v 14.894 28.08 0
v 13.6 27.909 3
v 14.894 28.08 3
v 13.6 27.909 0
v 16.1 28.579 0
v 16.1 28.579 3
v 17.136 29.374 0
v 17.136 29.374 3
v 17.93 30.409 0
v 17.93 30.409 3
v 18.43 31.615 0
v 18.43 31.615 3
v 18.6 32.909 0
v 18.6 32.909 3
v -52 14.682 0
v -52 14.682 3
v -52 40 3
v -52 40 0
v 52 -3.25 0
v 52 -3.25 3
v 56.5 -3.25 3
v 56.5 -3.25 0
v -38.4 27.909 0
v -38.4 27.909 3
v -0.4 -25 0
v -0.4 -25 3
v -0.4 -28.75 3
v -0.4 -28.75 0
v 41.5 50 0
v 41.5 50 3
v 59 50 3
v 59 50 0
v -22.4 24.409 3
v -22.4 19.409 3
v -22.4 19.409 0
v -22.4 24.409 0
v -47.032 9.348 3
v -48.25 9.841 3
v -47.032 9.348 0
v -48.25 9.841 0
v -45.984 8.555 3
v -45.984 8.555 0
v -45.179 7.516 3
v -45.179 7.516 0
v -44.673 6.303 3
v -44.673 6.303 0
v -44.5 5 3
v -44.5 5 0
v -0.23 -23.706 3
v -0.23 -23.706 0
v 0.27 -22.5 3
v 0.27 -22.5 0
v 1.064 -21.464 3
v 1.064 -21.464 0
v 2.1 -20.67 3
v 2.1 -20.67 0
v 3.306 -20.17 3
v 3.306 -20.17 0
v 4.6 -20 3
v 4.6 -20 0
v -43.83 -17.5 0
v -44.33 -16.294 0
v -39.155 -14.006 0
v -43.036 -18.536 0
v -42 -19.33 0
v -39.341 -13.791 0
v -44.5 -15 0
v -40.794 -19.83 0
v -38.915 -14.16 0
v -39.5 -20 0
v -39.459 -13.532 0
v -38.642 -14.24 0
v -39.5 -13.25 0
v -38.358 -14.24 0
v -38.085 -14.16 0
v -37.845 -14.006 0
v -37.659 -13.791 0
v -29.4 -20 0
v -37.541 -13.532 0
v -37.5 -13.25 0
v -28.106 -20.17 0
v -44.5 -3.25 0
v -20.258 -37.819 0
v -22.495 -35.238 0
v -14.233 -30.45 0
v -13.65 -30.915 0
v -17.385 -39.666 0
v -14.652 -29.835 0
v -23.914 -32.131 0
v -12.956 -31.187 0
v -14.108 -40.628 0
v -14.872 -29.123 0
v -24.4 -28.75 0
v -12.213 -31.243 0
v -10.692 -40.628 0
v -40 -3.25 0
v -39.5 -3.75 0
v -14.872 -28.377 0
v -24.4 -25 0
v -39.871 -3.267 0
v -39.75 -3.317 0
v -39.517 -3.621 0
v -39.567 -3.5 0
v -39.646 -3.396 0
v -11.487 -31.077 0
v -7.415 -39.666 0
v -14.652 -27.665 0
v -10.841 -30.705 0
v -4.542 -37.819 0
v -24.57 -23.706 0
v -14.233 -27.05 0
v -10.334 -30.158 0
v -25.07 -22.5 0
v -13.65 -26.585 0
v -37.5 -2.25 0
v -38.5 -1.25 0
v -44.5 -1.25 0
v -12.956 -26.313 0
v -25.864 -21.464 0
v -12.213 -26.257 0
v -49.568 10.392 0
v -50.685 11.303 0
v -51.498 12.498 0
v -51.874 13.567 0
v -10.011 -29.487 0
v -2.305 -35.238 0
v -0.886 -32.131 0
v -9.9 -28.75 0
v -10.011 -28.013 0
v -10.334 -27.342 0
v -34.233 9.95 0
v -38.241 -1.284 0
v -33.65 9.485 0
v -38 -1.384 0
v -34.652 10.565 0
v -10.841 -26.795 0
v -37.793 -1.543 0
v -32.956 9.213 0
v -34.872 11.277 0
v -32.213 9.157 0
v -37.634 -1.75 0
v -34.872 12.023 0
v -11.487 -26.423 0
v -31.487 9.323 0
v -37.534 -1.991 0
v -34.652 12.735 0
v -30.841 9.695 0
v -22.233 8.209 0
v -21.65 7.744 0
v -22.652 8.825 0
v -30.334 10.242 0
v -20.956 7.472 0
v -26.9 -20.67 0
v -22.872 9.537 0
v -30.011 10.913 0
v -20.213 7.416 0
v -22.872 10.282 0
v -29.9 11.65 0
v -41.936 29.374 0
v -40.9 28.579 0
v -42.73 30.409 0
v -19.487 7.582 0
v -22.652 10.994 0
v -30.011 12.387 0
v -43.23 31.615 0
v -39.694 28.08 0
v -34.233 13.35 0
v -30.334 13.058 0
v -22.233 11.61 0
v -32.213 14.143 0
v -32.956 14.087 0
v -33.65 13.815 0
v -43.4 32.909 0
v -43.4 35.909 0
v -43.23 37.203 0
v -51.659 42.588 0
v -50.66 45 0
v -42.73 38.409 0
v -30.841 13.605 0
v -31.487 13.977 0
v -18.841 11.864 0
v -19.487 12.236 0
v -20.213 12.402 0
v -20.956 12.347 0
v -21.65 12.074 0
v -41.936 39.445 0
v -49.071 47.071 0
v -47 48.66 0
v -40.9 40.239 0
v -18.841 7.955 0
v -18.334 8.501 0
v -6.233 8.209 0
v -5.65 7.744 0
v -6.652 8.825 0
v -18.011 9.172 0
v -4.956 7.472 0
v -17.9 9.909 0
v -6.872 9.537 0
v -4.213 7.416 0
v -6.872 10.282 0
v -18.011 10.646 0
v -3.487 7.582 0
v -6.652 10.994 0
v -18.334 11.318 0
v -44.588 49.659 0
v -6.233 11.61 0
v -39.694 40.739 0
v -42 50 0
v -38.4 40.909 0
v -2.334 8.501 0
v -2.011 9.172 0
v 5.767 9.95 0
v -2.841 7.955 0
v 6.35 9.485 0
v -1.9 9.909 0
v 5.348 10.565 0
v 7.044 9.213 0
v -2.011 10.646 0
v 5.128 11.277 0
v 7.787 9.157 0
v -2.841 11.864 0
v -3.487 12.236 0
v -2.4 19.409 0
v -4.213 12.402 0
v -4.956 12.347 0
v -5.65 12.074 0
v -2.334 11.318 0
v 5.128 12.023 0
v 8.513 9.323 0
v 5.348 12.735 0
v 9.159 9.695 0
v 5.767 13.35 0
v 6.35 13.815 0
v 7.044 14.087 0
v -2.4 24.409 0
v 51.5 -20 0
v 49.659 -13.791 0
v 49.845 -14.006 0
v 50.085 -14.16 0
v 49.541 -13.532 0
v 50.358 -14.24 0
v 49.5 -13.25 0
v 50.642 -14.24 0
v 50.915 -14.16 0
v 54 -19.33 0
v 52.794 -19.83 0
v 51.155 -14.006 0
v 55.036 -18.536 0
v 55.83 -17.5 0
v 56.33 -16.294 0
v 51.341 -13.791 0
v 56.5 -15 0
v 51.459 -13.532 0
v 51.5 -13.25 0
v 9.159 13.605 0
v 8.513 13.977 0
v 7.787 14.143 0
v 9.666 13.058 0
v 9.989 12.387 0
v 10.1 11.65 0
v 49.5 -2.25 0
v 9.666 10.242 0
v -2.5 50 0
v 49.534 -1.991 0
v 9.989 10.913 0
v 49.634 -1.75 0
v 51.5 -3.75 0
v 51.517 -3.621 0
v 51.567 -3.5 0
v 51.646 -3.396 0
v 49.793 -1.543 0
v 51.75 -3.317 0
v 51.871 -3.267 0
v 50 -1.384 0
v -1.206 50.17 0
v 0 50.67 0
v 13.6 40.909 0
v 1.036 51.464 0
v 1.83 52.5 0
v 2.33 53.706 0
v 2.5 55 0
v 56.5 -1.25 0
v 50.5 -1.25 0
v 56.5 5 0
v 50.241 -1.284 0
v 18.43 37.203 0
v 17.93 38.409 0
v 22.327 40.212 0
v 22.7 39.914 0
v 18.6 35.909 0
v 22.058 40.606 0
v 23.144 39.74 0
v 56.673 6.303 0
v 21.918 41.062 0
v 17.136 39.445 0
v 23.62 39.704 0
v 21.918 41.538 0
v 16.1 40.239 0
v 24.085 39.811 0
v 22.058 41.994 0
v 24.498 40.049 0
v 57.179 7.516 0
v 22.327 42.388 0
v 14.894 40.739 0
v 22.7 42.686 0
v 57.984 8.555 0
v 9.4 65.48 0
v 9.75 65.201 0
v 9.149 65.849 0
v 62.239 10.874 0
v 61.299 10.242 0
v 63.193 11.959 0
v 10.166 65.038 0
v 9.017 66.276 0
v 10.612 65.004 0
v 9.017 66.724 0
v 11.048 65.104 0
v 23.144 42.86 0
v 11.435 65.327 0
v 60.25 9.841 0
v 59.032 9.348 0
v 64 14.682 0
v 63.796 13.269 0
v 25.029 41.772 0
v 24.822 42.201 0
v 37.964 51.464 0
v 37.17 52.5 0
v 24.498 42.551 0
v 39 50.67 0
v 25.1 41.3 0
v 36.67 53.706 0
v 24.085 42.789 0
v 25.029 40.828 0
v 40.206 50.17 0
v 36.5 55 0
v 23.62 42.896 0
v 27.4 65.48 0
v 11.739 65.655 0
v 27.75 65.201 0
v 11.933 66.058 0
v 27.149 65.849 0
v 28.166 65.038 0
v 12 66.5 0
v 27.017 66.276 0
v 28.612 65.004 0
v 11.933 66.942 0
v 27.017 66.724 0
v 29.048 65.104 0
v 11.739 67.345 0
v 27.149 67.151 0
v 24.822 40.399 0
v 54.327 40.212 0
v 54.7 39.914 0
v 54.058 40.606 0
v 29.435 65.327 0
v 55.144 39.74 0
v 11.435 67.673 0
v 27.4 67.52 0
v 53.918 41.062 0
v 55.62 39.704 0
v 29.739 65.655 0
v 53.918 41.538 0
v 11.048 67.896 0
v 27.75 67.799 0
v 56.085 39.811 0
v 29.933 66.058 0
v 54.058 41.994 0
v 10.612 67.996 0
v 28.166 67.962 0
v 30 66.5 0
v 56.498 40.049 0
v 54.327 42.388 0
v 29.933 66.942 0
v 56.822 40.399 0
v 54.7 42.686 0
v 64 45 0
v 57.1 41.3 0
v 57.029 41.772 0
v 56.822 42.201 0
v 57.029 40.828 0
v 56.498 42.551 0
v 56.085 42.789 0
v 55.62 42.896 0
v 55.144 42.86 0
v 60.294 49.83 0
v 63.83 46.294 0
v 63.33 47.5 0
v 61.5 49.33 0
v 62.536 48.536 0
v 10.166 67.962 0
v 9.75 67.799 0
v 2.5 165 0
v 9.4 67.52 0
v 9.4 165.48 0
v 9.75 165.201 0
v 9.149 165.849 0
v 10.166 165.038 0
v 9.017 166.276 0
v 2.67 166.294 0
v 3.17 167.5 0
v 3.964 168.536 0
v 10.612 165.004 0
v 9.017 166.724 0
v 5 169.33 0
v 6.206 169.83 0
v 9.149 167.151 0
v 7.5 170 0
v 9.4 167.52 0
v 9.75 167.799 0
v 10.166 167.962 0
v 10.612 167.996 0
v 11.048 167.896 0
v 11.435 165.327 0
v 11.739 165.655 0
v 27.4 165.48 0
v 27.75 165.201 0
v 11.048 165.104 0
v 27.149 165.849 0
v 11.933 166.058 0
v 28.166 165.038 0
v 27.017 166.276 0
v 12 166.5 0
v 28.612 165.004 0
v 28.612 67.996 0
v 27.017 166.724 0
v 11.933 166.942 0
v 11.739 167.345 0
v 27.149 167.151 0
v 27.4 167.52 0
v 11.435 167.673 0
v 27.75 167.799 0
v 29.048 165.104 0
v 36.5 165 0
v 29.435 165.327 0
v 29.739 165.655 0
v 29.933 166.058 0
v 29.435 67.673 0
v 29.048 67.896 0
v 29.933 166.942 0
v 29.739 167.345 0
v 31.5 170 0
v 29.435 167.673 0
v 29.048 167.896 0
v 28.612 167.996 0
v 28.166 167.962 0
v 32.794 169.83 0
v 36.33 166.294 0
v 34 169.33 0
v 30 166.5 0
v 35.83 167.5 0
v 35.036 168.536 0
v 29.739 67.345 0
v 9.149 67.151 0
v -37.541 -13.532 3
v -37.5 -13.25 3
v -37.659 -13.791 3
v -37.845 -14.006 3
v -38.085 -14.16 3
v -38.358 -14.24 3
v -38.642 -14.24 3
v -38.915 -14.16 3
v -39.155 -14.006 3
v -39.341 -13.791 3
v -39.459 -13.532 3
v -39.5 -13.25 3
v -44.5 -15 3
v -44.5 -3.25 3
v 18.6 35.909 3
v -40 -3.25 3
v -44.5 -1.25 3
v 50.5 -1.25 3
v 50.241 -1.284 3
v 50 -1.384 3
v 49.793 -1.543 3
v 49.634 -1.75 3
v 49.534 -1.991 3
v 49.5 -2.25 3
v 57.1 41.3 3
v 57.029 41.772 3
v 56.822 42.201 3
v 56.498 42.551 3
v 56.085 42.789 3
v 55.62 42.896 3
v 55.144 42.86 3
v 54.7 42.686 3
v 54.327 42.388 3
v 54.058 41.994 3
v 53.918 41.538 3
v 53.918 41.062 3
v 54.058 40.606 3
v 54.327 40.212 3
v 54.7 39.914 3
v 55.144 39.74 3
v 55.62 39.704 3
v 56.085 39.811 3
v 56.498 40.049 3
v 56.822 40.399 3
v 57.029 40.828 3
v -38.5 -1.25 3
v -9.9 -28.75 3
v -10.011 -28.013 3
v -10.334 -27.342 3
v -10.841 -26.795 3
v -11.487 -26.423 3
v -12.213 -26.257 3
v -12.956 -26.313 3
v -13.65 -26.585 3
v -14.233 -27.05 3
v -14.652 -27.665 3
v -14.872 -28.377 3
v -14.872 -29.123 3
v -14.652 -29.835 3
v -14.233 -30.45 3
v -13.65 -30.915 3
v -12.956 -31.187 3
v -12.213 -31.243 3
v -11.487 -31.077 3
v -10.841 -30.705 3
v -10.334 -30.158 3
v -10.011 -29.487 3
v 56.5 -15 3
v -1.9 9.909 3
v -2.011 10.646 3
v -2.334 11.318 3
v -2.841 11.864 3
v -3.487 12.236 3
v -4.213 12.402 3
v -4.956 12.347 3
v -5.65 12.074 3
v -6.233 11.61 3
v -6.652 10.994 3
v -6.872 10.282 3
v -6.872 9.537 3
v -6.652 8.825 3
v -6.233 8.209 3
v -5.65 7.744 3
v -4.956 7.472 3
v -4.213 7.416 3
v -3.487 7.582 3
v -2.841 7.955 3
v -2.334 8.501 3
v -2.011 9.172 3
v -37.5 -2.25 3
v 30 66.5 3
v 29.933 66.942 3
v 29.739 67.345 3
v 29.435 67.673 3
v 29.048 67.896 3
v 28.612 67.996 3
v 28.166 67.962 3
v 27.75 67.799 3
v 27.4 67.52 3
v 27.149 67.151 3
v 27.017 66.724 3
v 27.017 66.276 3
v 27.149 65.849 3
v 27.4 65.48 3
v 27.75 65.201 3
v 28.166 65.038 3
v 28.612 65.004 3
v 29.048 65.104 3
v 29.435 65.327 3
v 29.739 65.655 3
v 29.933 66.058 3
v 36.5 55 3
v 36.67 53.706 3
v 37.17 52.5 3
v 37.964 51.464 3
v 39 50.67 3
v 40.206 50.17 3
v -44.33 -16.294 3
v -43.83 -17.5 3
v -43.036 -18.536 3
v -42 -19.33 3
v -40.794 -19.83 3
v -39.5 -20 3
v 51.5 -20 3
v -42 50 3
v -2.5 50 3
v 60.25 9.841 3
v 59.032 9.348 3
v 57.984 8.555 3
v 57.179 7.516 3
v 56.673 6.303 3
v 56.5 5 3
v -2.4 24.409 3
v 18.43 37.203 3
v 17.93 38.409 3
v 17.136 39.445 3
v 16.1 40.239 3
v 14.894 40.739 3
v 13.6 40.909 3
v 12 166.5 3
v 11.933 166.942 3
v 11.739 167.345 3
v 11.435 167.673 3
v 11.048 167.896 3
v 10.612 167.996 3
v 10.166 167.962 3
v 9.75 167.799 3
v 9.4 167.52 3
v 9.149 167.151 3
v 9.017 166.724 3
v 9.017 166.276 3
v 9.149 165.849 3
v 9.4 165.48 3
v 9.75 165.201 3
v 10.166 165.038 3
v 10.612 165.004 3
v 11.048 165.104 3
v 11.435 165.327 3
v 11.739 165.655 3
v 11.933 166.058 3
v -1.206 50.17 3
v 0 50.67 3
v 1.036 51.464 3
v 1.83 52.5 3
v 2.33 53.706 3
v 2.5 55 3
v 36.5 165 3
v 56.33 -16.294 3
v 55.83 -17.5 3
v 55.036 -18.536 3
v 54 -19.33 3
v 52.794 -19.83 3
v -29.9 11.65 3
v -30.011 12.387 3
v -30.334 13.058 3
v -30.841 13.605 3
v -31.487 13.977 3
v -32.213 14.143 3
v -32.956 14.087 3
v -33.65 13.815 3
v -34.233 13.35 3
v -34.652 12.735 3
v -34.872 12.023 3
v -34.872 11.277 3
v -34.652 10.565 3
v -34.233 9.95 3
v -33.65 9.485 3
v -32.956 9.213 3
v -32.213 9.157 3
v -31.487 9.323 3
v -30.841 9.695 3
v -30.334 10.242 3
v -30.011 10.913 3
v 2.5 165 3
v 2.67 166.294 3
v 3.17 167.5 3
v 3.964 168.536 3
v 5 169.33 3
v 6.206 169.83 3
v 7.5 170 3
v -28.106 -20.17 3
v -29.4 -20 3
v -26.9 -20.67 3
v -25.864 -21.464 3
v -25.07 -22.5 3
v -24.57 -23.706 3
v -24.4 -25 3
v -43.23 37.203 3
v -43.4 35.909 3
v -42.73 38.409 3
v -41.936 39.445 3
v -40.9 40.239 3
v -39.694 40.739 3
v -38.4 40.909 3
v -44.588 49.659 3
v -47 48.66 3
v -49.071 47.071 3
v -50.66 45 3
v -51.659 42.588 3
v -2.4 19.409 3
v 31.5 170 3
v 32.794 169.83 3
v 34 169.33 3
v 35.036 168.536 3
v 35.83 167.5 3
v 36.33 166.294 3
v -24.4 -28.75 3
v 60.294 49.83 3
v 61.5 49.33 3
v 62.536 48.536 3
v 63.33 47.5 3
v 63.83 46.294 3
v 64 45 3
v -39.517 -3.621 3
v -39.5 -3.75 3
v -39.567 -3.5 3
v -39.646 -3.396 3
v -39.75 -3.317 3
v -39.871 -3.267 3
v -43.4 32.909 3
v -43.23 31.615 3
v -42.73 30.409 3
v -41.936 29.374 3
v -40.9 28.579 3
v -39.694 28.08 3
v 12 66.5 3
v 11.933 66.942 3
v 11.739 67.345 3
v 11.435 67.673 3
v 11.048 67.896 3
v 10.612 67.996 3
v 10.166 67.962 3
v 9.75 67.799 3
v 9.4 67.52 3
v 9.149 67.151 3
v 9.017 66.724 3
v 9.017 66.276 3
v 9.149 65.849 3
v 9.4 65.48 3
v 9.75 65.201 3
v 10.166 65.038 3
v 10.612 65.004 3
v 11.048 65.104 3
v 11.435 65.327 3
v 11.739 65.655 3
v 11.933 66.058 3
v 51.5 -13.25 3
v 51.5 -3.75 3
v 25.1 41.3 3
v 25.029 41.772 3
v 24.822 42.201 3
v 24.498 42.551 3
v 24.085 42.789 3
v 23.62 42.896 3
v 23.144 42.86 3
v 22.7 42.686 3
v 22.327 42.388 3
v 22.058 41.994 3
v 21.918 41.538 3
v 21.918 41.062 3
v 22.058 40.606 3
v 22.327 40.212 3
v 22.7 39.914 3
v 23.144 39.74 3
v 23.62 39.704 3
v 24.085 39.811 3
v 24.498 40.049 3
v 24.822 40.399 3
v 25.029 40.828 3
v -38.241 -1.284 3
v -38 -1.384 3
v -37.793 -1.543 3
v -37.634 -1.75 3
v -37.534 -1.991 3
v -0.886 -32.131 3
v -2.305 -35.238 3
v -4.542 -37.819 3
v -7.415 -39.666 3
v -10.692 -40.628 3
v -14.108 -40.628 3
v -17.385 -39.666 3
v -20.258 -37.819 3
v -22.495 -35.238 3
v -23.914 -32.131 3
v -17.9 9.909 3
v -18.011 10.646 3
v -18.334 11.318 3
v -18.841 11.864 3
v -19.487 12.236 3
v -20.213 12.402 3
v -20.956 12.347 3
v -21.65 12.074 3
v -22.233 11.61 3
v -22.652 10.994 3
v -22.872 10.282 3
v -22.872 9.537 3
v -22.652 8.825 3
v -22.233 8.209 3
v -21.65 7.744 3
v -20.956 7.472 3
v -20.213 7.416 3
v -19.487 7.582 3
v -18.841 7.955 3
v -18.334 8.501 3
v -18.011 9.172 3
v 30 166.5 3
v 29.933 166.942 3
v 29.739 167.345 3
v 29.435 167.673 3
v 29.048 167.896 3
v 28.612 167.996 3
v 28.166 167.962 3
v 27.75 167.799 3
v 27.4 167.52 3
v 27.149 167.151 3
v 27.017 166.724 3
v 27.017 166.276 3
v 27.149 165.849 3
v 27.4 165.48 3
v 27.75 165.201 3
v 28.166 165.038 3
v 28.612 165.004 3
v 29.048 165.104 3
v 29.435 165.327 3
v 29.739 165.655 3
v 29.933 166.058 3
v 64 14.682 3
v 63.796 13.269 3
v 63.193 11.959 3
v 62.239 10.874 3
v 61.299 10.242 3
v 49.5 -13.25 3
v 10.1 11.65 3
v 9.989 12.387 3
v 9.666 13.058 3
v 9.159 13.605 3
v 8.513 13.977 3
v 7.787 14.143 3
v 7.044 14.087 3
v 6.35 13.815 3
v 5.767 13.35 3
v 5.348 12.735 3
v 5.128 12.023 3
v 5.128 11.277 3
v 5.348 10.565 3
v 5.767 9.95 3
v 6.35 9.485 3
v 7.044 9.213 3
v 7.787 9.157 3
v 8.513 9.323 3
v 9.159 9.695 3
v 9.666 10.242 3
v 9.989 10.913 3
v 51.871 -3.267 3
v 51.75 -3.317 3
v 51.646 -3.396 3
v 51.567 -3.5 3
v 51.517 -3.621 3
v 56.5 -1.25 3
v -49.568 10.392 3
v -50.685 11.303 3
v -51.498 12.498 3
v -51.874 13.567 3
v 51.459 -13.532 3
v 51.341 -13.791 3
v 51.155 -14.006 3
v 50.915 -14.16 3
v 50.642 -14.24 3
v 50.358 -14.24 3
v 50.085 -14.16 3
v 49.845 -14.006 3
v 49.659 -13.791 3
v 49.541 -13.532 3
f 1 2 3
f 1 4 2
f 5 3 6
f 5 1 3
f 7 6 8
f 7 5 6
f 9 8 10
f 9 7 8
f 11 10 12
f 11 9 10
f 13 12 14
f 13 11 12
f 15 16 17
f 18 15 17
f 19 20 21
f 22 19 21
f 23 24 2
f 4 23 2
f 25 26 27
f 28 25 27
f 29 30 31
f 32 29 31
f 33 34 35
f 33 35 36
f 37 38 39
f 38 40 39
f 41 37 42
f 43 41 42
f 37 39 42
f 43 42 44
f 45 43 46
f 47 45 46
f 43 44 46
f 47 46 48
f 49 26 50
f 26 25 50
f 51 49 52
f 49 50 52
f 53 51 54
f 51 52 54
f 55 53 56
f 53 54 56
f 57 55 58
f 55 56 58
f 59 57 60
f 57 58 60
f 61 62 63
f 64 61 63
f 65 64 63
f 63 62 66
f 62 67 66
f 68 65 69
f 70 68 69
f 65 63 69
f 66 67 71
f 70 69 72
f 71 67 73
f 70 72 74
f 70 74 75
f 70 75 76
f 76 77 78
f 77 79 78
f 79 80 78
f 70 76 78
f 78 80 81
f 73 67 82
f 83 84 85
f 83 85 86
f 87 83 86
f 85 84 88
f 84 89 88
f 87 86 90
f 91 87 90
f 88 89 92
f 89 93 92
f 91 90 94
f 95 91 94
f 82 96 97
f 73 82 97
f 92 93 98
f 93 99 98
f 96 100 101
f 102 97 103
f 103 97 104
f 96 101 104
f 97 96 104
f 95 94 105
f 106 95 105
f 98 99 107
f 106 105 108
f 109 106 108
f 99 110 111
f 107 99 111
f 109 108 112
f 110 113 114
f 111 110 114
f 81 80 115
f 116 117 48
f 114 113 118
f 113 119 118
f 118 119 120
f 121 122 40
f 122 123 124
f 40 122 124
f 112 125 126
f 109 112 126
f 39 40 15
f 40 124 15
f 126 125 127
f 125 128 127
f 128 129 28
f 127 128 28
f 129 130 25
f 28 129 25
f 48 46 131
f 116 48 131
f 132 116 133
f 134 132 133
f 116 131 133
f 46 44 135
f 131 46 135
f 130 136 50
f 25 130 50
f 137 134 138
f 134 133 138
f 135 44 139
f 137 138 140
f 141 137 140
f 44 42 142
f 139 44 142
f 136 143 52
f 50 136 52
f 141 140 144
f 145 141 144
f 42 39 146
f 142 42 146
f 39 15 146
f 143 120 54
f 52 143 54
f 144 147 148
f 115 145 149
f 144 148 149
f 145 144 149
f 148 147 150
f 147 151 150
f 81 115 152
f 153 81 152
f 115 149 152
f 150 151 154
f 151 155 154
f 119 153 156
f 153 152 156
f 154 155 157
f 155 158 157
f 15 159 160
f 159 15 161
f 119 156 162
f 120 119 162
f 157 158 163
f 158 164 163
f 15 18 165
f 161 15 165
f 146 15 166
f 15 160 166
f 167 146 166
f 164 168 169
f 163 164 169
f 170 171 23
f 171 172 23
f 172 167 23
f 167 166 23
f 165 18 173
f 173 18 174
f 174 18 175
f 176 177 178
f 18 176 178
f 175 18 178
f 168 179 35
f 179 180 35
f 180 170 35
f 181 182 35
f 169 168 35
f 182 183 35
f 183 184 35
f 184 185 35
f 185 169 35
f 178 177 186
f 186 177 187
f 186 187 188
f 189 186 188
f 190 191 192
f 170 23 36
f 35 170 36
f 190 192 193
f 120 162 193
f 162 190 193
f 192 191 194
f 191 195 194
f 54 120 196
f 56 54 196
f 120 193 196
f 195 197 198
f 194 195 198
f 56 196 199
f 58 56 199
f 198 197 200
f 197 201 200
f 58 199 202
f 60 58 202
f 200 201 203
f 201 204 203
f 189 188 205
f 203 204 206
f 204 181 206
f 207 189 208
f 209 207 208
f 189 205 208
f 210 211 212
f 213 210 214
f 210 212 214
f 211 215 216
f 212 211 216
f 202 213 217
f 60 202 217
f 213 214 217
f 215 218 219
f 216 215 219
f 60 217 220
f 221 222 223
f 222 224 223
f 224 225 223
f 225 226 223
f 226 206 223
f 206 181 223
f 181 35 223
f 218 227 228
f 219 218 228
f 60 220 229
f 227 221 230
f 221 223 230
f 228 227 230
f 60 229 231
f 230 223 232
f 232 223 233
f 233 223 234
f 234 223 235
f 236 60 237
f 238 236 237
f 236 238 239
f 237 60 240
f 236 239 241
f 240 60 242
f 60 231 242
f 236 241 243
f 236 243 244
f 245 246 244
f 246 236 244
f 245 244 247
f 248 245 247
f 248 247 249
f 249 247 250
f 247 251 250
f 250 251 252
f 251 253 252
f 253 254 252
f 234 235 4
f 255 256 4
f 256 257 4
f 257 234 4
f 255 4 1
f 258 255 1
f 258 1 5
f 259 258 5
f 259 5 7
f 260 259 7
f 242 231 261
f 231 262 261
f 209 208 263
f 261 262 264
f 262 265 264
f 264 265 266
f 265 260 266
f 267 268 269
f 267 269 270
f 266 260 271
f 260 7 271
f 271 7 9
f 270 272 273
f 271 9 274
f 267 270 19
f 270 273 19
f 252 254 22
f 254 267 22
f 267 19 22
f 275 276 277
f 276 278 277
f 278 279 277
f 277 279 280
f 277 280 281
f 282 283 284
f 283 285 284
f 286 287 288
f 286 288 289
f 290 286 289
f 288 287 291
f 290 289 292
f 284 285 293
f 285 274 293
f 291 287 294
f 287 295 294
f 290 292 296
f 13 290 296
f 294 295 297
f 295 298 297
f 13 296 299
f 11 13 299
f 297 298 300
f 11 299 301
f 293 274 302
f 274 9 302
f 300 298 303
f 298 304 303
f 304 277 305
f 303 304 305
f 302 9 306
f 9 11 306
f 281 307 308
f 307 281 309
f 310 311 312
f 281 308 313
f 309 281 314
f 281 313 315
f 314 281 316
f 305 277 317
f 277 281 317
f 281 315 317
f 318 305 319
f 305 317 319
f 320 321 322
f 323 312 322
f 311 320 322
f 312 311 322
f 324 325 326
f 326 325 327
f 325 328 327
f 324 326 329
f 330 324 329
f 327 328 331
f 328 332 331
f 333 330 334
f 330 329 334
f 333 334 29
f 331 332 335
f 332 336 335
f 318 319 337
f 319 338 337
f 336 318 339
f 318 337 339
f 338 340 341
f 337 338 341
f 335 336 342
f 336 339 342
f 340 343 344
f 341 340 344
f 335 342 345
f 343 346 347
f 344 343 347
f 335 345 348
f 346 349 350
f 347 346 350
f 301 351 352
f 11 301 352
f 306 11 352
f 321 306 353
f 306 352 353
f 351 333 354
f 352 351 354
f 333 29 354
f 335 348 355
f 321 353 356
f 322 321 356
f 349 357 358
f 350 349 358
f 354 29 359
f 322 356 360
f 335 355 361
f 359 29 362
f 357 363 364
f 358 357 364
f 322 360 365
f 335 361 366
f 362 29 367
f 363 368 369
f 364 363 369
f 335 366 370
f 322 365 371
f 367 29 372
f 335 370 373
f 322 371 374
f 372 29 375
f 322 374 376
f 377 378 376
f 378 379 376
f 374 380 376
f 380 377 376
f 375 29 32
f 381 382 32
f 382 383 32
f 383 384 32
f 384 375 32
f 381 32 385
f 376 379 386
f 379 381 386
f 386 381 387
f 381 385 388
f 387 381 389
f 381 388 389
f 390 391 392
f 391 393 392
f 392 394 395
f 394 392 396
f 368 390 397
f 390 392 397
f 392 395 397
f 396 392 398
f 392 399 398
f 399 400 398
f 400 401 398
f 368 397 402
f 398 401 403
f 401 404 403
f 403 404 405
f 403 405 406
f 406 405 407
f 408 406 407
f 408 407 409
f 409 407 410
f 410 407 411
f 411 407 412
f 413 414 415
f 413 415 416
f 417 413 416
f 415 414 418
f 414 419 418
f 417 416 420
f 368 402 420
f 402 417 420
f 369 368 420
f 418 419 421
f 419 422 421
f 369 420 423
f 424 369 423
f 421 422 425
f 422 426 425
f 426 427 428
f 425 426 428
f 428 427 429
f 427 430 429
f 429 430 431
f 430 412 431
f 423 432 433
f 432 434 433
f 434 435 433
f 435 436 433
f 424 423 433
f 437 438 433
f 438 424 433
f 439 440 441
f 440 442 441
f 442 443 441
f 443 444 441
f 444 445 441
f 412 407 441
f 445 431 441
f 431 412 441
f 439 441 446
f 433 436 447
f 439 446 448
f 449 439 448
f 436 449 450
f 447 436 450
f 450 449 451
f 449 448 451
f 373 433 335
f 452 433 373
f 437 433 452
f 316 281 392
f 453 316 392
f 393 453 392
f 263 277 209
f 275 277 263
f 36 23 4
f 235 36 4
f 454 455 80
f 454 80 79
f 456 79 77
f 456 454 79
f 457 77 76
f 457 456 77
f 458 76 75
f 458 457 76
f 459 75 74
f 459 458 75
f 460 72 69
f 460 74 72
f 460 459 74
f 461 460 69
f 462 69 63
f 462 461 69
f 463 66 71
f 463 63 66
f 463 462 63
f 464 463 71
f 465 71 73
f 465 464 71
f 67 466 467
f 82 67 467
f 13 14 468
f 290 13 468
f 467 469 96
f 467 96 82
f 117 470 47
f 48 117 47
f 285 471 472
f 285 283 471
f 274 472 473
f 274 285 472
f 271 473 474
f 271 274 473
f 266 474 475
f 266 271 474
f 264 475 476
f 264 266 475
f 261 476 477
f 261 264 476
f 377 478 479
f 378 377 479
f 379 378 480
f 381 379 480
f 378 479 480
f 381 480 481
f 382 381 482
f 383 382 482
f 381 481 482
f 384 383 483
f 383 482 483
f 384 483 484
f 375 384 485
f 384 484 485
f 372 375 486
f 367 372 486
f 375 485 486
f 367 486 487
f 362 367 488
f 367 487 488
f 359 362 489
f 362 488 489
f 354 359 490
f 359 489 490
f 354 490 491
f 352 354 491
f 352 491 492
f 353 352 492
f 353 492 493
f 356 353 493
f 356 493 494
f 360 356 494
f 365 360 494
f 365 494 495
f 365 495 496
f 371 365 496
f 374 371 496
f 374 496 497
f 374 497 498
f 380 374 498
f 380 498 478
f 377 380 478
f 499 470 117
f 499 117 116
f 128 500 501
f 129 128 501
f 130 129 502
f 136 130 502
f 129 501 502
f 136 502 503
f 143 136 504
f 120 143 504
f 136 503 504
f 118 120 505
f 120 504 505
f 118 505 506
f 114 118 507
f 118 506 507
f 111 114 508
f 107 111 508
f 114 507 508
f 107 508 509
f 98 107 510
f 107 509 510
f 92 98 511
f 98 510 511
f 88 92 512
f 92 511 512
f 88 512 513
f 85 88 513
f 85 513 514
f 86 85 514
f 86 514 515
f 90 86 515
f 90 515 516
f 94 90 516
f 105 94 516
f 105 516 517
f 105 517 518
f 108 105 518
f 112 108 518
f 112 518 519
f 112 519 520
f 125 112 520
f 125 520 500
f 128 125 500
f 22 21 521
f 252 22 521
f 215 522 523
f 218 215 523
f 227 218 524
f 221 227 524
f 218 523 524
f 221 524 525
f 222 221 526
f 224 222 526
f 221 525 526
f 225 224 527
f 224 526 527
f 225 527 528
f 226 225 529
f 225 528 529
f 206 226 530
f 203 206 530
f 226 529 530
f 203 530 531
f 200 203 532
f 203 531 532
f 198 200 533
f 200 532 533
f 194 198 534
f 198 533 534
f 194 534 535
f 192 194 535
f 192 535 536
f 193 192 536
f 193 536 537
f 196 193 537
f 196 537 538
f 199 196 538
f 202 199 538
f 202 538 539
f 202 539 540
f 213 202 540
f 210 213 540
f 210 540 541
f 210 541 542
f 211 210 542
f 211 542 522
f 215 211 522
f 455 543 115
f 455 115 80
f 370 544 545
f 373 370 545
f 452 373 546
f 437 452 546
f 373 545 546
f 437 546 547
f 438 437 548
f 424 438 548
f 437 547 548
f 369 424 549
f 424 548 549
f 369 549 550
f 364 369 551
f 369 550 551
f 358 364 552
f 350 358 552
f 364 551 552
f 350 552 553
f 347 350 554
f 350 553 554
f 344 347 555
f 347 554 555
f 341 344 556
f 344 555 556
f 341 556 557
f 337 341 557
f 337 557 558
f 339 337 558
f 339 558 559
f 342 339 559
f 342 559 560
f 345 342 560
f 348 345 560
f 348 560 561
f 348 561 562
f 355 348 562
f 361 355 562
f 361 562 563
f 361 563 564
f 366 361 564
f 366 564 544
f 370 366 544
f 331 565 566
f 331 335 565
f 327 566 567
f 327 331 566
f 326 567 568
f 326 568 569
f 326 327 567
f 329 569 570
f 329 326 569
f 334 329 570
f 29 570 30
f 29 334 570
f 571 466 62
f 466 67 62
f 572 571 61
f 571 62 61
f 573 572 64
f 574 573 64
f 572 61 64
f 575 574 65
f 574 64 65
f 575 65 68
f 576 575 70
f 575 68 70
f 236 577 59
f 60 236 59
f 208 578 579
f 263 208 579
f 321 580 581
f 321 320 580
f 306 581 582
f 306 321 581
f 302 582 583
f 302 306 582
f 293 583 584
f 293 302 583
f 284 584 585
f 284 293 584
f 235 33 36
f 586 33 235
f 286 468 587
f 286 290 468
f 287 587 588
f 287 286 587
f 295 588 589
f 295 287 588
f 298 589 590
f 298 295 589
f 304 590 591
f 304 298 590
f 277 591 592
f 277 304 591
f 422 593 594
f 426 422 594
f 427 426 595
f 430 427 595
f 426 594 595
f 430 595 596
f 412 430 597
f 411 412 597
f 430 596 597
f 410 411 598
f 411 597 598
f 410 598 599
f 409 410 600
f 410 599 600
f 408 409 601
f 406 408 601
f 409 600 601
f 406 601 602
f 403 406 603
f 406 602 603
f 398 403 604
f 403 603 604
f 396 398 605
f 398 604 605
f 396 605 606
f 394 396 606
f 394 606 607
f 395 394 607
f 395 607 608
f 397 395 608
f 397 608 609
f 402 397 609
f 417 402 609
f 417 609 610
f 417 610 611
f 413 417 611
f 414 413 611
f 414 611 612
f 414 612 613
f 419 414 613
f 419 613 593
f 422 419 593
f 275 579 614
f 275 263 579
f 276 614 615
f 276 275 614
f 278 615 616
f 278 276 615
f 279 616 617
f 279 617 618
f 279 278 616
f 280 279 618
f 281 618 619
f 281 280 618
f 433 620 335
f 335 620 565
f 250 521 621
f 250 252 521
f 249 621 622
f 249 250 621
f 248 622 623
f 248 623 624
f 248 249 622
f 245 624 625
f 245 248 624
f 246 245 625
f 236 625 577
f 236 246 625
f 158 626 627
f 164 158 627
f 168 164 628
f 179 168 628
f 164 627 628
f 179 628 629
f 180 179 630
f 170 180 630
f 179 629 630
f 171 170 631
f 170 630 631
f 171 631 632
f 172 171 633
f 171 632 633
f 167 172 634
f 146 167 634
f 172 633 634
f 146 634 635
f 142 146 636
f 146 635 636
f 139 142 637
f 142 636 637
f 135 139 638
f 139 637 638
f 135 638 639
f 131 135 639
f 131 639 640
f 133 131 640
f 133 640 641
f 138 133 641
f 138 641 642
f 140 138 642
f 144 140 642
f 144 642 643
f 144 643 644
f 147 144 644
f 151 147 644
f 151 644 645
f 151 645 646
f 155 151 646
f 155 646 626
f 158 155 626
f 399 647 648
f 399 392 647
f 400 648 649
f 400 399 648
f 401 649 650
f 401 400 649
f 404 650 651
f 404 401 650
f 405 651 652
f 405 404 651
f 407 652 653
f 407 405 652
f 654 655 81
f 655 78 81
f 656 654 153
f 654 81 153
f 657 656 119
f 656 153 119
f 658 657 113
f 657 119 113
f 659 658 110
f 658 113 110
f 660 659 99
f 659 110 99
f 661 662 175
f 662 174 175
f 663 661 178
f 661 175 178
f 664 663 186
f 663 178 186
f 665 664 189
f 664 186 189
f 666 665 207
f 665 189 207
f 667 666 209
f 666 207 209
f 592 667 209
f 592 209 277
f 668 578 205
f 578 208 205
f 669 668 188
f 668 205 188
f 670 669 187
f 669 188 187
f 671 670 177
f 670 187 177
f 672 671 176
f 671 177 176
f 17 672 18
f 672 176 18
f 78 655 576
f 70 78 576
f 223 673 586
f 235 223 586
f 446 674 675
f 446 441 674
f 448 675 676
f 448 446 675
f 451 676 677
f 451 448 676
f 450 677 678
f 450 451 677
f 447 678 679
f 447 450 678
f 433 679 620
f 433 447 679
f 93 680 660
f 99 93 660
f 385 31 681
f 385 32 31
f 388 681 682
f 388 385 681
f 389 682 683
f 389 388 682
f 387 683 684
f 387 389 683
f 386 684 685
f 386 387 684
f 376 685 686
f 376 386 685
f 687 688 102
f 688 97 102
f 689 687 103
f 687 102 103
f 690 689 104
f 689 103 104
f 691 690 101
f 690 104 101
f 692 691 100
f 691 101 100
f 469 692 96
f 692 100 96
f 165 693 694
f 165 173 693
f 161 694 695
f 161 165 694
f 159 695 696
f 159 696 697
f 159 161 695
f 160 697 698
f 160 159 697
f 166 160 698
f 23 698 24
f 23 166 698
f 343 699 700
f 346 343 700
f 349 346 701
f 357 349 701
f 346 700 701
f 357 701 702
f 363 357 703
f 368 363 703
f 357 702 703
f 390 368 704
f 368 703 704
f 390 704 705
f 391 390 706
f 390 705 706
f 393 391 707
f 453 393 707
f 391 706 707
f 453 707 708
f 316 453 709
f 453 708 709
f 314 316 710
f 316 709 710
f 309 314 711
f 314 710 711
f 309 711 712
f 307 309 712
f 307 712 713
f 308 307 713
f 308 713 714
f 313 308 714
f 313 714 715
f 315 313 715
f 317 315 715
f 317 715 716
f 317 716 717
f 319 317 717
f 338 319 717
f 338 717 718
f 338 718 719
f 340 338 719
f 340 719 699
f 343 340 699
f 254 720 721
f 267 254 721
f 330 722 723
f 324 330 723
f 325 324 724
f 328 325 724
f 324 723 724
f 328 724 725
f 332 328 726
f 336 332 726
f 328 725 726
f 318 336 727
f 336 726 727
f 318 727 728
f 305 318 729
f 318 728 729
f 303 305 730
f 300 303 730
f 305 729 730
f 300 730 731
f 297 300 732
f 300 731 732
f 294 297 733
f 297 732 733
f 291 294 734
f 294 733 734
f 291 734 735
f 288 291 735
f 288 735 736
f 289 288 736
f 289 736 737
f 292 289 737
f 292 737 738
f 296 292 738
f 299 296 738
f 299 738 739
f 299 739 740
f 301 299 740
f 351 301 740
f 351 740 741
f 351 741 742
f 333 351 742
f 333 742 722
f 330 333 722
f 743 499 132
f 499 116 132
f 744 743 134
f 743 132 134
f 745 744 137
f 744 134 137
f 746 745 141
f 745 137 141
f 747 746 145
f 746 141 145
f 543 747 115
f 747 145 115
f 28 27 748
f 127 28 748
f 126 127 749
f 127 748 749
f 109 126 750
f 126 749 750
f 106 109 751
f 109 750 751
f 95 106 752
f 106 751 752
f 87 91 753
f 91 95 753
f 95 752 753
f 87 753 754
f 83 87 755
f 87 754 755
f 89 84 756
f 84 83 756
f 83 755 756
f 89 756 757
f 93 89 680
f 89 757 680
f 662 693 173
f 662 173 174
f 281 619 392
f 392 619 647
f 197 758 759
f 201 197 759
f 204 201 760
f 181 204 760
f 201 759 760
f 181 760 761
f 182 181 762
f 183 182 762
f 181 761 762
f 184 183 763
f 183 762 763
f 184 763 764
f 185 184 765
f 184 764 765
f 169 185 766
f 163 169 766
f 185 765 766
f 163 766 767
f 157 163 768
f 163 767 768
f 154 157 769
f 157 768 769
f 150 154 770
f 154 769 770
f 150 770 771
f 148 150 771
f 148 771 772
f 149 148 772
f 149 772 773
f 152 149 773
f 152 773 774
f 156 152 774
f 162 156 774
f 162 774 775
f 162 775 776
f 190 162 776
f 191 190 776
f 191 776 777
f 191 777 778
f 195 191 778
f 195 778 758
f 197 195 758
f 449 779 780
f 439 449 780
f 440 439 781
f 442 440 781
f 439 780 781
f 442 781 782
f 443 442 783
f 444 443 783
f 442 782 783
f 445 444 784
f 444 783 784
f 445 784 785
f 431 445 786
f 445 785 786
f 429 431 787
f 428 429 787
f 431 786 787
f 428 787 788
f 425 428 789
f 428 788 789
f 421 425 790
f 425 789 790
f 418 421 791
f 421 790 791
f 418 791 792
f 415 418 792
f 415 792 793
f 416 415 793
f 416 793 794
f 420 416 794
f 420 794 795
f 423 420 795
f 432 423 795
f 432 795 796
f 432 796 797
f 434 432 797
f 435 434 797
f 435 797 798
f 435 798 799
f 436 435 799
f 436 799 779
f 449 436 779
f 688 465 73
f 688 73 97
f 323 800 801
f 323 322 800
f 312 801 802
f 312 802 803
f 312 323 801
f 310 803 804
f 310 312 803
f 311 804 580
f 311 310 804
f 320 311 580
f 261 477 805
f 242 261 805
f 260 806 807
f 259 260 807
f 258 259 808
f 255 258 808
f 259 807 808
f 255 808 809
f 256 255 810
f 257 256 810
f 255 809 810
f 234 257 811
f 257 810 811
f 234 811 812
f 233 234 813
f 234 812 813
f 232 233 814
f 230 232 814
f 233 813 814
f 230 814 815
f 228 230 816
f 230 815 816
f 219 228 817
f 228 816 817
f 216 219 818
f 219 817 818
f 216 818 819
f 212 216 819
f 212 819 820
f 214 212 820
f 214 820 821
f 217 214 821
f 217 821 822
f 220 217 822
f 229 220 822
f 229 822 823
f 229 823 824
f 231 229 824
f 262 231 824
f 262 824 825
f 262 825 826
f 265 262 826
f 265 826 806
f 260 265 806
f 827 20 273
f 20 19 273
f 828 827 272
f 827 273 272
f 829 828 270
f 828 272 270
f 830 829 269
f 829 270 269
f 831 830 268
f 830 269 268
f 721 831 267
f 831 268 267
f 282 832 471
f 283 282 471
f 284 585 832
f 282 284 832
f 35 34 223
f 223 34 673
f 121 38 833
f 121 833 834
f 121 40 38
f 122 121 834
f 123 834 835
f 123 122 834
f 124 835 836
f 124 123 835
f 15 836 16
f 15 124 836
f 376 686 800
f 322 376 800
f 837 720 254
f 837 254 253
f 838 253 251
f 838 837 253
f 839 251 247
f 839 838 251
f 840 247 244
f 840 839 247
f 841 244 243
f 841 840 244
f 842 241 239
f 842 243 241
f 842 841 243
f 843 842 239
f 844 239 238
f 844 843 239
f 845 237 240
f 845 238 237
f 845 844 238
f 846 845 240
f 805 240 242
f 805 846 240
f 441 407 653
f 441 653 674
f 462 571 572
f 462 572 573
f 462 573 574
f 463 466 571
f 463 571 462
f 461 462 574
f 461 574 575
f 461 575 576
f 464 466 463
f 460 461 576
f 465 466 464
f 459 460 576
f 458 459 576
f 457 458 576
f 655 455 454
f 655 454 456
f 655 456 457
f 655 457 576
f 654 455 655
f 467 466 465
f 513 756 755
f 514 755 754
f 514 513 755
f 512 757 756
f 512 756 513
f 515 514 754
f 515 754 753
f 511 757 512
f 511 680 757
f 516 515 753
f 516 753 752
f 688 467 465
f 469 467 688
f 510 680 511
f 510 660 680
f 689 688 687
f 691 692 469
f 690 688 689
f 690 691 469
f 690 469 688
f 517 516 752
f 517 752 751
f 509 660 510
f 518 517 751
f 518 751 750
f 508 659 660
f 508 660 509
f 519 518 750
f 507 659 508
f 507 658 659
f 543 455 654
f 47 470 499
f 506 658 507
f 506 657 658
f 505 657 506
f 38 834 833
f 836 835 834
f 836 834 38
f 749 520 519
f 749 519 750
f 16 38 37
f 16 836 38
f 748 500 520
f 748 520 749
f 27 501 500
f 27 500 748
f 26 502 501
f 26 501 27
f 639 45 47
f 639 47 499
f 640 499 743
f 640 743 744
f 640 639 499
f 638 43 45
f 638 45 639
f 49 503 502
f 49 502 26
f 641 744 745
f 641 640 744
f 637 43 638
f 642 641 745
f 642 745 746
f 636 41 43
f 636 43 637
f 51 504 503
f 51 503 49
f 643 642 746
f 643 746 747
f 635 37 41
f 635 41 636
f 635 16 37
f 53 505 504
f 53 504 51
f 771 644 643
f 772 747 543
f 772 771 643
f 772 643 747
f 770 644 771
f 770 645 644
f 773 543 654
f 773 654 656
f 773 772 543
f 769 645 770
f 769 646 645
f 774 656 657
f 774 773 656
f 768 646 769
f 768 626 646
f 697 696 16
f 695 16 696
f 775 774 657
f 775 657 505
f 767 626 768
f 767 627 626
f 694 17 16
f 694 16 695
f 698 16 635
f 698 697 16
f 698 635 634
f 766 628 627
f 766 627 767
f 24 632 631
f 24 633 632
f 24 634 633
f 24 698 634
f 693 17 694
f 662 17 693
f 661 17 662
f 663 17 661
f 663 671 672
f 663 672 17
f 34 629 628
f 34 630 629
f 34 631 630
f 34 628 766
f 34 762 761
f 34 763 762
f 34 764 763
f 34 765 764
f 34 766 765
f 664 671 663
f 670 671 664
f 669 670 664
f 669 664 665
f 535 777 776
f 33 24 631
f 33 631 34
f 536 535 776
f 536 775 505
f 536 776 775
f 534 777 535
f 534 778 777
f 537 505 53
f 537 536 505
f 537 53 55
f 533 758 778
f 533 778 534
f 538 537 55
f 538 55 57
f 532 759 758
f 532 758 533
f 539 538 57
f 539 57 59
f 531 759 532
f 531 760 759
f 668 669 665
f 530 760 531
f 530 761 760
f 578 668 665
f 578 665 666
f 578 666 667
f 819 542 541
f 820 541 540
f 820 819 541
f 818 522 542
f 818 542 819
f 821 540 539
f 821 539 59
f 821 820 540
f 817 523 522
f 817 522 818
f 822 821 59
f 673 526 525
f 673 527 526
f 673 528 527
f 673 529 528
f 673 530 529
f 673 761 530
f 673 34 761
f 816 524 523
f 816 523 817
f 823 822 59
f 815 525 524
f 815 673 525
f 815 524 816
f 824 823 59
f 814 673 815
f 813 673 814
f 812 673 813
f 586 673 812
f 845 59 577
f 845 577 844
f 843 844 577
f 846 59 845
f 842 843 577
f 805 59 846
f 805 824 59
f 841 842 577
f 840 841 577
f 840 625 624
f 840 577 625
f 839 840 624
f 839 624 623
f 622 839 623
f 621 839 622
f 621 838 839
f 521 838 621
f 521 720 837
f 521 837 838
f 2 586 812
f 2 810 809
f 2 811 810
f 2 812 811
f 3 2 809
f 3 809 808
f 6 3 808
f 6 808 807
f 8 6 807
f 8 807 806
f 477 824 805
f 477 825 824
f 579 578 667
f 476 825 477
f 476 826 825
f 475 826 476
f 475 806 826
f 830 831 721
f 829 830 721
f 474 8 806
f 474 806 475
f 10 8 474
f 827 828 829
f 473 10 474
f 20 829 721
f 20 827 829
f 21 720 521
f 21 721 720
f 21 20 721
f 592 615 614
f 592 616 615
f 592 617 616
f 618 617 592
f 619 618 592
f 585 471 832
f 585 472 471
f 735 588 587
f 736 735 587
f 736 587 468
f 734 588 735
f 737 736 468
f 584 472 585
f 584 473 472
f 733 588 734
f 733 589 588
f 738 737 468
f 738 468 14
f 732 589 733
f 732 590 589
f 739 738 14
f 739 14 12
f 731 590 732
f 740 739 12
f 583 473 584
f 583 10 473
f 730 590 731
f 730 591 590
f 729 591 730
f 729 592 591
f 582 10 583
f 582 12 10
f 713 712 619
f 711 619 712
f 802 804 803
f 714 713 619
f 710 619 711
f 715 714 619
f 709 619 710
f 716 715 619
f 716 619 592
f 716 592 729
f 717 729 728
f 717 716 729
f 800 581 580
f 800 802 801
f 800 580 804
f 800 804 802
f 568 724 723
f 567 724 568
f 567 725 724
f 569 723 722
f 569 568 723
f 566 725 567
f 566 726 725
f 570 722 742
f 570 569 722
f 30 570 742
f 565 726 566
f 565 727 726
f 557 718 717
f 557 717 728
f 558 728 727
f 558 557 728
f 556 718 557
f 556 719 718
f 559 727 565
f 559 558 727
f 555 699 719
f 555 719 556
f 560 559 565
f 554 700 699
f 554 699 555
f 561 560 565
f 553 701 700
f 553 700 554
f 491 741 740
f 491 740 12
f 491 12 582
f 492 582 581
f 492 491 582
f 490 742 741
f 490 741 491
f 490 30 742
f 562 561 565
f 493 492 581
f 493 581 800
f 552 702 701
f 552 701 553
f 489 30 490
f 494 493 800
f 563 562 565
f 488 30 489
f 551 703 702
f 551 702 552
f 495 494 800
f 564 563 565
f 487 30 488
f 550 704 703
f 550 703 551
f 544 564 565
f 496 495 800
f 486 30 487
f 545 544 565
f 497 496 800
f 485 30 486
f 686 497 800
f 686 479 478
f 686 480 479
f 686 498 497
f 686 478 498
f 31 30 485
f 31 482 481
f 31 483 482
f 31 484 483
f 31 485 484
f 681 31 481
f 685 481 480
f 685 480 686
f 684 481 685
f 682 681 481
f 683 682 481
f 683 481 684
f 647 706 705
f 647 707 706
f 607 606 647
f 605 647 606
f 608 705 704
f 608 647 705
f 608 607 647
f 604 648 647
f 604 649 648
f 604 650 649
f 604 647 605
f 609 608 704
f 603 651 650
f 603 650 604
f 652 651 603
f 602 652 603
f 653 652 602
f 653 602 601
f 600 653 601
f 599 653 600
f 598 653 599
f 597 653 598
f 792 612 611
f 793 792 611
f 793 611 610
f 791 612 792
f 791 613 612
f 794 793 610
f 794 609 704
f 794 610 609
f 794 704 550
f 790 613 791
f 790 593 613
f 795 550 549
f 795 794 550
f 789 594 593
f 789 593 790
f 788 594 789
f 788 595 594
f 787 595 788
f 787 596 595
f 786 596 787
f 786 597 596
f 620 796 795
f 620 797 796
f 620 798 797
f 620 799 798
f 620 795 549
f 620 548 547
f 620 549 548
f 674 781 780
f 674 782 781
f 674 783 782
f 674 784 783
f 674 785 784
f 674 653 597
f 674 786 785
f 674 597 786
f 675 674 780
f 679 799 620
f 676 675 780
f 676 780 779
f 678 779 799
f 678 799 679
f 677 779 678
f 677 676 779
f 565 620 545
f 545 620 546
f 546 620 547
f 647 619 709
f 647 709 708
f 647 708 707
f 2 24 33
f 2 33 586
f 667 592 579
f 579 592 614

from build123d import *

# Parameters (mm, degrees)
SKETCH1_W           = 200
SKETCH1_H           = 300
SKETCH1_W_2         = 158.527362204
SKETCH1_H_2         = 20
BOSS_EXTRUDE1_DEPTH = 3
SKETCH2_R           = 2.5
CUT_EXTRUDE1_DEPTH  = 5
CUT_EXTRUDE3_DEPTH  = 10
CUT_EXTRUDE4_REACH  = 183.673
SKETCH5_W           = 62
SKETCH5_H           = 13
FILLET2_R           = 5
FILLET3_R           = 10
FILLET4_R           = 5
CUT_EXTRUDE6_REACH  = 183.673
SKETCH7_R           = 1.6
CUT_EXTRUDE7_REACH  = 183.673
SKETCH8_R           = 2.5
SKETCH8_W           = 20
SKETCH8_H           = 5
FILLET6_R           = 1
FILLET7_R           = 0.5
SKETCH9_R           = 1.5
CUT_EXTRUDE8_DEPTH  = 10
FILLET8_R           = 5


with BuildPart() as part:
    # Sketch1 → Boss-Extrude1 (new body)
    with BuildSketch(Plane.XY):
        Rectangle(SKETCH1_W, SKETCH1_H)
        with Locations((20.736318898, 160)):
            Rectangle(SKETCH1_W_2, SKETCH1_H_2)
    extrude(amount=BOSS_EXTRUDE1_DEPTH)

    # Sketch2 → Cut-Extrude1 (cut)
    with BuildSketch(Plane.XY.offset(3)):
        with Locations((-12.4, -28.75)):
            Circle(SKETCH2_R)
        with Locations((7.6, 11.65)):
            Circle(SKETCH2_R)
        with Locations((-32.4, 11.65)):
            Circle(SKETCH2_R)
        Polygon((-44.5, -3.25), (-44.5, -1.25), (-37.5, -1.25), (-37.5, -13.25), (-39.5, -13.25), (-39.5, -3.25), align=None)
        Polygon((51.5, -3.25), (56.5, -3.25), (56.5, -1.25), (49.5, -1.25), (49.5, -13.25), (51.5, -13.25), align=None)
        with BuildLine():
            Line((-44.5, -3.25), (-44.5, -1.25))
            ThreePointArc((-44.5, -1.25), (-45.5, -2.25), (-44.5, -3.25))
        make_face()
        with BuildLine():
            ThreePointArc((-37.5, -13.25), (-38.5, -14.25), (-39.5, -13.25))
            Line((-39.5, -13.25), (-37.5, -13.25))
        make_face()
        with BuildLine():
            ThreePointArc((51.5, -13.25), (50.5, -14.25), (49.5, -13.25))
            Line((49.5, -13.25), (51.5, -13.25))
        make_face()
        with BuildLine():
            ThreePointArc((56.5, -1.25), (57.5, -2.25), (56.5, -3.25))
            Line((56.5, -3.25), (56.5, -1.25))
        make_face()
    extrude(amount=-CUT_EXTRUDE1_DEPTH, mode=Mode.SUBTRACT)

    # Sketch4 → Cut-Extrude3 (cut)
    with BuildSketch(Plane.XY.offset(3)):
        with BuildLine():
            ThreePointArc((-44.5, -3.25), (-45.5, -2.25), (-44.5, -1.25))
            Line((-44.5, -1.25), (-44.5, 10))
            Line((-44.5, 10), (-52, 10))
            Line((-52, 10), (-52, 50))
            Line((-52, 50), (2.5, 50))
            Line((2.5, 50), (2.5, 170))
            Line((2.5, 170), (-58.527362204, 170))
            Line((-58.527362204, 170), (-58.527362204, 150))
            Line((-58.527362204, 150), (-100, 150))
            Line((-100, 150), (-100, -150))
            Line((-100, -150), (100, -150))
            Line((100, -150), (100, 170))
            Line((100, 170), (36.5, 170))
            Line((36.5, 170), (36.5, 50))
            Line((36.5, 50), (64, 50))
            Line((64, 50), (64, 10))
            Line((64, 10), (56.5, 10))
            Line((56.5, 10), (56.5, -1.25))
            ThreePointArc((56.5, -1.25), (57.5, -2.25), (56.5, -3.25))
            Line((56.5, -3.25), (56.5, -20))
            Line((56.5, -20), (-0.4, -20))
            Line((-0.4, -20), (-0.4, -28.75))
            ThreePointArc((-0.4, -28.75), (-12.4, -40.75), (-24.4, -28.75))
            Line((-24.4, -28.75), (-24.4, -20))
            Line((-24.4, -20), (-44.5, -20))
            Line((-44.5, -20), (-44.5, -3.25))
        make_face()
    extrude(amount=-CUT_EXTRUDE3_DEPTH, mode=Mode.SUBTRACT)

    # Sketch5 → Cut-Extrude4 (cut, up to next)
    with BuildSketch(Plane.XY.offset(3), mode=Mode.PRIVATE) as cut_extrude4_sk1:
        with Locations((-12.4, 34.409289568)):
            Rectangle(SKETCH5_W, SKETCH5_H)
    cut_extrude4_tool1 = extrude(cut_extrude4_sk1.sketch, amount=-CUT_EXTRUDE4_REACH, mode=Mode.PRIVATE) & part.part
    add(cut_extrude4_tool1.solids().sort_by_distance((-12.4, 34.40929, 3))[0], mode=Mode.SUBTRACT)

    # Fillet2
    fillet2_edges = [part.edges().sort_by_distance(p)[0] for p in [
        (-43.4, 40.909289568, 1.5),
        (18.6, 40.909289568, 1.5),
        (18.6, 27.909289568, 1.5),
        (-43.4, 27.909289568, 1.5),
    ]]
    fillet(fillet2_edges, radius=FILLET2_R)

    # Fillet3
    fillet3_edges = [part.edges().sort_by_distance(p)[0] for p in [
        (-52, 50, 1.5),
    ]]
    fillet(fillet3_edges, radius=FILLET3_R)

    # Fillet4
    fillet4_edges = [part.edges().sort_by_distance(p)[0] for p in [
        (-44.5, -20, 1.5),
        (-24.4, -20, 1.5),
        (-0.4, -20, 1.5),
        (56.5, 10, 1.5),
        (64, 50, 1.5),
        (2.5, 50, 1.5),
        (36.5, 50, 1.5),
        (56.5, -20, 1.5),
        (-44.5, 10, 1.5),
    ]]
    fillet(fillet4_edges, radius=FILLET4_R)

    # Sketch7 → Cut-Extrude6 (cut, up to next)
    with BuildSketch(Plane.XY.offset(3), mode=Mode.PRIVATE) as cut_extrude6_sk1:
        with Locations((55.5, 41.3)):
            Circle(SKETCH7_R)
    cut_extrude6_tool1 = extrude(cut_extrude6_sk1.sketch, amount=-CUT_EXTRUDE6_REACH, mode=Mode.PRIVATE) & part.part
    # Sketch7 → Cut-Extrude6 (cut, up to next)
    with BuildSketch(Plane.XY.offset(3), mode=Mode.PRIVATE) as cut_extrude6_sk2:
        with Locations((23.5, 41.3)):
            Circle(SKETCH7_R)
    cut_extrude6_tool2 = extrude(cut_extrude6_sk2.sketch, amount=-CUT_EXTRUDE6_REACH, mode=Mode.PRIVATE) & part.part
    add(cut_extrude6_tool1.solids().sort_by_distance((55.5, 41.3, 3))[0], mode=Mode.SUBTRACT)
    add(cut_extrude6_tool2.solids().sort_by_distance((23.5, 41.3, 3))[0], mode=Mode.SUBTRACT)

    # Sketch8 → Cut-Extrude7 (cut, up to next)
    with BuildSketch(Plane.XY.offset(3), mode=Mode.PRIVATE) as cut_extrude7_sk1:
        with Locations((-4.4, 9.909289568)):
            Circle(SKETCH8_R)
    cut_extrude7_tool1 = extrude(cut_extrude7_sk1.sketch, amount=-CUT_EXTRUDE7_REACH, mode=Mode.PRIVATE) & part.part
    # Sketch8 → Cut-Extrude7 (cut, up to next)
    with BuildSketch(Plane.XY.offset(3), mode=Mode.PRIVATE) as cut_extrude7_sk2:
        with Locations((-20.4, 9.909289568)):
            Circle(SKETCH8_R)
    cut_extrude7_tool2 = extrude(cut_extrude7_sk2.sketch, amount=-CUT_EXTRUDE7_REACH, mode=Mode.PRIVATE) & part.part
    # Sketch8 → Cut-Extrude7 (cut, up to next)
    with BuildSketch(Plane.XY.offset(3), mode=Mode.PRIVATE) as cut_extrude7_sk3:
        with Locations((-12.4, 21.909289568)):
            Rectangle(SKETCH8_W, SKETCH8_H)
    cut_extrude7_tool3 = extrude(cut_extrude7_sk3.sketch, amount=-CUT_EXTRUDE7_REACH, mode=Mode.PRIVATE) & part.part
    add(cut_extrude7_tool1.solids().sort_by_distance((-4.4, 9.90929, 3))[0], mode=Mode.SUBTRACT)
    add(cut_extrude7_tool2.solids().sort_by_distance((-20.4, 9.90929, 3))[0], mode=Mode.SUBTRACT)
    add(cut_extrude7_tool3.solids().sort_by_distance((-12.4, 21.90929, 3))[0], mode=Mode.SUBTRACT)

    # Fillet6
    fillet6_edges = [part.edges().sort_by_distance(p)[0] for p in [
        (-37.5, -1.25, 1.5),
        (49.5, -1.25, 1.5),
    ]]
    fillet(fillet6_edges, radius=FILLET6_R)

    # Fillet7
    fillet7_edges = [part.edges().sort_by_distance(p)[0] for p in [
        (-39.5, -3.25, 1.5),
        (51.5, -3.25, 1.5),
    ]]
    fillet(fillet7_edges, radius=FILLET7_R)

    # Sketch9 → Cut-Extrude8 (cut)
    with BuildSketch(Plane.XY.offset(3)):
        with Locations((10.5, 166.5)):
            Circle(SKETCH9_R)
        with Locations((10.5, 66.5)):
            Circle(SKETCH9_R)
        with Locations((28.5, 166.5)):
            Circle(SKETCH9_R)
        with Locations((28.5, 66.5)):
            Circle(SKETCH9_R)
    extrude(amount=-CUT_EXTRUDE8_DEPTH, mode=Mode.SUBTRACT)

    # Fillet8
    fillet8_edges = [part.edges().sort_by_distance(p)[0] for p in [
        (2.5, 170, 1.5),
        (36.5, 170, 1.5),
        (-52, 10, 1.5),
        (64, 10, 1.5),
    ]]
    fillet(fillet8_edges, radius=FILLET8_R)


solid = part.part
